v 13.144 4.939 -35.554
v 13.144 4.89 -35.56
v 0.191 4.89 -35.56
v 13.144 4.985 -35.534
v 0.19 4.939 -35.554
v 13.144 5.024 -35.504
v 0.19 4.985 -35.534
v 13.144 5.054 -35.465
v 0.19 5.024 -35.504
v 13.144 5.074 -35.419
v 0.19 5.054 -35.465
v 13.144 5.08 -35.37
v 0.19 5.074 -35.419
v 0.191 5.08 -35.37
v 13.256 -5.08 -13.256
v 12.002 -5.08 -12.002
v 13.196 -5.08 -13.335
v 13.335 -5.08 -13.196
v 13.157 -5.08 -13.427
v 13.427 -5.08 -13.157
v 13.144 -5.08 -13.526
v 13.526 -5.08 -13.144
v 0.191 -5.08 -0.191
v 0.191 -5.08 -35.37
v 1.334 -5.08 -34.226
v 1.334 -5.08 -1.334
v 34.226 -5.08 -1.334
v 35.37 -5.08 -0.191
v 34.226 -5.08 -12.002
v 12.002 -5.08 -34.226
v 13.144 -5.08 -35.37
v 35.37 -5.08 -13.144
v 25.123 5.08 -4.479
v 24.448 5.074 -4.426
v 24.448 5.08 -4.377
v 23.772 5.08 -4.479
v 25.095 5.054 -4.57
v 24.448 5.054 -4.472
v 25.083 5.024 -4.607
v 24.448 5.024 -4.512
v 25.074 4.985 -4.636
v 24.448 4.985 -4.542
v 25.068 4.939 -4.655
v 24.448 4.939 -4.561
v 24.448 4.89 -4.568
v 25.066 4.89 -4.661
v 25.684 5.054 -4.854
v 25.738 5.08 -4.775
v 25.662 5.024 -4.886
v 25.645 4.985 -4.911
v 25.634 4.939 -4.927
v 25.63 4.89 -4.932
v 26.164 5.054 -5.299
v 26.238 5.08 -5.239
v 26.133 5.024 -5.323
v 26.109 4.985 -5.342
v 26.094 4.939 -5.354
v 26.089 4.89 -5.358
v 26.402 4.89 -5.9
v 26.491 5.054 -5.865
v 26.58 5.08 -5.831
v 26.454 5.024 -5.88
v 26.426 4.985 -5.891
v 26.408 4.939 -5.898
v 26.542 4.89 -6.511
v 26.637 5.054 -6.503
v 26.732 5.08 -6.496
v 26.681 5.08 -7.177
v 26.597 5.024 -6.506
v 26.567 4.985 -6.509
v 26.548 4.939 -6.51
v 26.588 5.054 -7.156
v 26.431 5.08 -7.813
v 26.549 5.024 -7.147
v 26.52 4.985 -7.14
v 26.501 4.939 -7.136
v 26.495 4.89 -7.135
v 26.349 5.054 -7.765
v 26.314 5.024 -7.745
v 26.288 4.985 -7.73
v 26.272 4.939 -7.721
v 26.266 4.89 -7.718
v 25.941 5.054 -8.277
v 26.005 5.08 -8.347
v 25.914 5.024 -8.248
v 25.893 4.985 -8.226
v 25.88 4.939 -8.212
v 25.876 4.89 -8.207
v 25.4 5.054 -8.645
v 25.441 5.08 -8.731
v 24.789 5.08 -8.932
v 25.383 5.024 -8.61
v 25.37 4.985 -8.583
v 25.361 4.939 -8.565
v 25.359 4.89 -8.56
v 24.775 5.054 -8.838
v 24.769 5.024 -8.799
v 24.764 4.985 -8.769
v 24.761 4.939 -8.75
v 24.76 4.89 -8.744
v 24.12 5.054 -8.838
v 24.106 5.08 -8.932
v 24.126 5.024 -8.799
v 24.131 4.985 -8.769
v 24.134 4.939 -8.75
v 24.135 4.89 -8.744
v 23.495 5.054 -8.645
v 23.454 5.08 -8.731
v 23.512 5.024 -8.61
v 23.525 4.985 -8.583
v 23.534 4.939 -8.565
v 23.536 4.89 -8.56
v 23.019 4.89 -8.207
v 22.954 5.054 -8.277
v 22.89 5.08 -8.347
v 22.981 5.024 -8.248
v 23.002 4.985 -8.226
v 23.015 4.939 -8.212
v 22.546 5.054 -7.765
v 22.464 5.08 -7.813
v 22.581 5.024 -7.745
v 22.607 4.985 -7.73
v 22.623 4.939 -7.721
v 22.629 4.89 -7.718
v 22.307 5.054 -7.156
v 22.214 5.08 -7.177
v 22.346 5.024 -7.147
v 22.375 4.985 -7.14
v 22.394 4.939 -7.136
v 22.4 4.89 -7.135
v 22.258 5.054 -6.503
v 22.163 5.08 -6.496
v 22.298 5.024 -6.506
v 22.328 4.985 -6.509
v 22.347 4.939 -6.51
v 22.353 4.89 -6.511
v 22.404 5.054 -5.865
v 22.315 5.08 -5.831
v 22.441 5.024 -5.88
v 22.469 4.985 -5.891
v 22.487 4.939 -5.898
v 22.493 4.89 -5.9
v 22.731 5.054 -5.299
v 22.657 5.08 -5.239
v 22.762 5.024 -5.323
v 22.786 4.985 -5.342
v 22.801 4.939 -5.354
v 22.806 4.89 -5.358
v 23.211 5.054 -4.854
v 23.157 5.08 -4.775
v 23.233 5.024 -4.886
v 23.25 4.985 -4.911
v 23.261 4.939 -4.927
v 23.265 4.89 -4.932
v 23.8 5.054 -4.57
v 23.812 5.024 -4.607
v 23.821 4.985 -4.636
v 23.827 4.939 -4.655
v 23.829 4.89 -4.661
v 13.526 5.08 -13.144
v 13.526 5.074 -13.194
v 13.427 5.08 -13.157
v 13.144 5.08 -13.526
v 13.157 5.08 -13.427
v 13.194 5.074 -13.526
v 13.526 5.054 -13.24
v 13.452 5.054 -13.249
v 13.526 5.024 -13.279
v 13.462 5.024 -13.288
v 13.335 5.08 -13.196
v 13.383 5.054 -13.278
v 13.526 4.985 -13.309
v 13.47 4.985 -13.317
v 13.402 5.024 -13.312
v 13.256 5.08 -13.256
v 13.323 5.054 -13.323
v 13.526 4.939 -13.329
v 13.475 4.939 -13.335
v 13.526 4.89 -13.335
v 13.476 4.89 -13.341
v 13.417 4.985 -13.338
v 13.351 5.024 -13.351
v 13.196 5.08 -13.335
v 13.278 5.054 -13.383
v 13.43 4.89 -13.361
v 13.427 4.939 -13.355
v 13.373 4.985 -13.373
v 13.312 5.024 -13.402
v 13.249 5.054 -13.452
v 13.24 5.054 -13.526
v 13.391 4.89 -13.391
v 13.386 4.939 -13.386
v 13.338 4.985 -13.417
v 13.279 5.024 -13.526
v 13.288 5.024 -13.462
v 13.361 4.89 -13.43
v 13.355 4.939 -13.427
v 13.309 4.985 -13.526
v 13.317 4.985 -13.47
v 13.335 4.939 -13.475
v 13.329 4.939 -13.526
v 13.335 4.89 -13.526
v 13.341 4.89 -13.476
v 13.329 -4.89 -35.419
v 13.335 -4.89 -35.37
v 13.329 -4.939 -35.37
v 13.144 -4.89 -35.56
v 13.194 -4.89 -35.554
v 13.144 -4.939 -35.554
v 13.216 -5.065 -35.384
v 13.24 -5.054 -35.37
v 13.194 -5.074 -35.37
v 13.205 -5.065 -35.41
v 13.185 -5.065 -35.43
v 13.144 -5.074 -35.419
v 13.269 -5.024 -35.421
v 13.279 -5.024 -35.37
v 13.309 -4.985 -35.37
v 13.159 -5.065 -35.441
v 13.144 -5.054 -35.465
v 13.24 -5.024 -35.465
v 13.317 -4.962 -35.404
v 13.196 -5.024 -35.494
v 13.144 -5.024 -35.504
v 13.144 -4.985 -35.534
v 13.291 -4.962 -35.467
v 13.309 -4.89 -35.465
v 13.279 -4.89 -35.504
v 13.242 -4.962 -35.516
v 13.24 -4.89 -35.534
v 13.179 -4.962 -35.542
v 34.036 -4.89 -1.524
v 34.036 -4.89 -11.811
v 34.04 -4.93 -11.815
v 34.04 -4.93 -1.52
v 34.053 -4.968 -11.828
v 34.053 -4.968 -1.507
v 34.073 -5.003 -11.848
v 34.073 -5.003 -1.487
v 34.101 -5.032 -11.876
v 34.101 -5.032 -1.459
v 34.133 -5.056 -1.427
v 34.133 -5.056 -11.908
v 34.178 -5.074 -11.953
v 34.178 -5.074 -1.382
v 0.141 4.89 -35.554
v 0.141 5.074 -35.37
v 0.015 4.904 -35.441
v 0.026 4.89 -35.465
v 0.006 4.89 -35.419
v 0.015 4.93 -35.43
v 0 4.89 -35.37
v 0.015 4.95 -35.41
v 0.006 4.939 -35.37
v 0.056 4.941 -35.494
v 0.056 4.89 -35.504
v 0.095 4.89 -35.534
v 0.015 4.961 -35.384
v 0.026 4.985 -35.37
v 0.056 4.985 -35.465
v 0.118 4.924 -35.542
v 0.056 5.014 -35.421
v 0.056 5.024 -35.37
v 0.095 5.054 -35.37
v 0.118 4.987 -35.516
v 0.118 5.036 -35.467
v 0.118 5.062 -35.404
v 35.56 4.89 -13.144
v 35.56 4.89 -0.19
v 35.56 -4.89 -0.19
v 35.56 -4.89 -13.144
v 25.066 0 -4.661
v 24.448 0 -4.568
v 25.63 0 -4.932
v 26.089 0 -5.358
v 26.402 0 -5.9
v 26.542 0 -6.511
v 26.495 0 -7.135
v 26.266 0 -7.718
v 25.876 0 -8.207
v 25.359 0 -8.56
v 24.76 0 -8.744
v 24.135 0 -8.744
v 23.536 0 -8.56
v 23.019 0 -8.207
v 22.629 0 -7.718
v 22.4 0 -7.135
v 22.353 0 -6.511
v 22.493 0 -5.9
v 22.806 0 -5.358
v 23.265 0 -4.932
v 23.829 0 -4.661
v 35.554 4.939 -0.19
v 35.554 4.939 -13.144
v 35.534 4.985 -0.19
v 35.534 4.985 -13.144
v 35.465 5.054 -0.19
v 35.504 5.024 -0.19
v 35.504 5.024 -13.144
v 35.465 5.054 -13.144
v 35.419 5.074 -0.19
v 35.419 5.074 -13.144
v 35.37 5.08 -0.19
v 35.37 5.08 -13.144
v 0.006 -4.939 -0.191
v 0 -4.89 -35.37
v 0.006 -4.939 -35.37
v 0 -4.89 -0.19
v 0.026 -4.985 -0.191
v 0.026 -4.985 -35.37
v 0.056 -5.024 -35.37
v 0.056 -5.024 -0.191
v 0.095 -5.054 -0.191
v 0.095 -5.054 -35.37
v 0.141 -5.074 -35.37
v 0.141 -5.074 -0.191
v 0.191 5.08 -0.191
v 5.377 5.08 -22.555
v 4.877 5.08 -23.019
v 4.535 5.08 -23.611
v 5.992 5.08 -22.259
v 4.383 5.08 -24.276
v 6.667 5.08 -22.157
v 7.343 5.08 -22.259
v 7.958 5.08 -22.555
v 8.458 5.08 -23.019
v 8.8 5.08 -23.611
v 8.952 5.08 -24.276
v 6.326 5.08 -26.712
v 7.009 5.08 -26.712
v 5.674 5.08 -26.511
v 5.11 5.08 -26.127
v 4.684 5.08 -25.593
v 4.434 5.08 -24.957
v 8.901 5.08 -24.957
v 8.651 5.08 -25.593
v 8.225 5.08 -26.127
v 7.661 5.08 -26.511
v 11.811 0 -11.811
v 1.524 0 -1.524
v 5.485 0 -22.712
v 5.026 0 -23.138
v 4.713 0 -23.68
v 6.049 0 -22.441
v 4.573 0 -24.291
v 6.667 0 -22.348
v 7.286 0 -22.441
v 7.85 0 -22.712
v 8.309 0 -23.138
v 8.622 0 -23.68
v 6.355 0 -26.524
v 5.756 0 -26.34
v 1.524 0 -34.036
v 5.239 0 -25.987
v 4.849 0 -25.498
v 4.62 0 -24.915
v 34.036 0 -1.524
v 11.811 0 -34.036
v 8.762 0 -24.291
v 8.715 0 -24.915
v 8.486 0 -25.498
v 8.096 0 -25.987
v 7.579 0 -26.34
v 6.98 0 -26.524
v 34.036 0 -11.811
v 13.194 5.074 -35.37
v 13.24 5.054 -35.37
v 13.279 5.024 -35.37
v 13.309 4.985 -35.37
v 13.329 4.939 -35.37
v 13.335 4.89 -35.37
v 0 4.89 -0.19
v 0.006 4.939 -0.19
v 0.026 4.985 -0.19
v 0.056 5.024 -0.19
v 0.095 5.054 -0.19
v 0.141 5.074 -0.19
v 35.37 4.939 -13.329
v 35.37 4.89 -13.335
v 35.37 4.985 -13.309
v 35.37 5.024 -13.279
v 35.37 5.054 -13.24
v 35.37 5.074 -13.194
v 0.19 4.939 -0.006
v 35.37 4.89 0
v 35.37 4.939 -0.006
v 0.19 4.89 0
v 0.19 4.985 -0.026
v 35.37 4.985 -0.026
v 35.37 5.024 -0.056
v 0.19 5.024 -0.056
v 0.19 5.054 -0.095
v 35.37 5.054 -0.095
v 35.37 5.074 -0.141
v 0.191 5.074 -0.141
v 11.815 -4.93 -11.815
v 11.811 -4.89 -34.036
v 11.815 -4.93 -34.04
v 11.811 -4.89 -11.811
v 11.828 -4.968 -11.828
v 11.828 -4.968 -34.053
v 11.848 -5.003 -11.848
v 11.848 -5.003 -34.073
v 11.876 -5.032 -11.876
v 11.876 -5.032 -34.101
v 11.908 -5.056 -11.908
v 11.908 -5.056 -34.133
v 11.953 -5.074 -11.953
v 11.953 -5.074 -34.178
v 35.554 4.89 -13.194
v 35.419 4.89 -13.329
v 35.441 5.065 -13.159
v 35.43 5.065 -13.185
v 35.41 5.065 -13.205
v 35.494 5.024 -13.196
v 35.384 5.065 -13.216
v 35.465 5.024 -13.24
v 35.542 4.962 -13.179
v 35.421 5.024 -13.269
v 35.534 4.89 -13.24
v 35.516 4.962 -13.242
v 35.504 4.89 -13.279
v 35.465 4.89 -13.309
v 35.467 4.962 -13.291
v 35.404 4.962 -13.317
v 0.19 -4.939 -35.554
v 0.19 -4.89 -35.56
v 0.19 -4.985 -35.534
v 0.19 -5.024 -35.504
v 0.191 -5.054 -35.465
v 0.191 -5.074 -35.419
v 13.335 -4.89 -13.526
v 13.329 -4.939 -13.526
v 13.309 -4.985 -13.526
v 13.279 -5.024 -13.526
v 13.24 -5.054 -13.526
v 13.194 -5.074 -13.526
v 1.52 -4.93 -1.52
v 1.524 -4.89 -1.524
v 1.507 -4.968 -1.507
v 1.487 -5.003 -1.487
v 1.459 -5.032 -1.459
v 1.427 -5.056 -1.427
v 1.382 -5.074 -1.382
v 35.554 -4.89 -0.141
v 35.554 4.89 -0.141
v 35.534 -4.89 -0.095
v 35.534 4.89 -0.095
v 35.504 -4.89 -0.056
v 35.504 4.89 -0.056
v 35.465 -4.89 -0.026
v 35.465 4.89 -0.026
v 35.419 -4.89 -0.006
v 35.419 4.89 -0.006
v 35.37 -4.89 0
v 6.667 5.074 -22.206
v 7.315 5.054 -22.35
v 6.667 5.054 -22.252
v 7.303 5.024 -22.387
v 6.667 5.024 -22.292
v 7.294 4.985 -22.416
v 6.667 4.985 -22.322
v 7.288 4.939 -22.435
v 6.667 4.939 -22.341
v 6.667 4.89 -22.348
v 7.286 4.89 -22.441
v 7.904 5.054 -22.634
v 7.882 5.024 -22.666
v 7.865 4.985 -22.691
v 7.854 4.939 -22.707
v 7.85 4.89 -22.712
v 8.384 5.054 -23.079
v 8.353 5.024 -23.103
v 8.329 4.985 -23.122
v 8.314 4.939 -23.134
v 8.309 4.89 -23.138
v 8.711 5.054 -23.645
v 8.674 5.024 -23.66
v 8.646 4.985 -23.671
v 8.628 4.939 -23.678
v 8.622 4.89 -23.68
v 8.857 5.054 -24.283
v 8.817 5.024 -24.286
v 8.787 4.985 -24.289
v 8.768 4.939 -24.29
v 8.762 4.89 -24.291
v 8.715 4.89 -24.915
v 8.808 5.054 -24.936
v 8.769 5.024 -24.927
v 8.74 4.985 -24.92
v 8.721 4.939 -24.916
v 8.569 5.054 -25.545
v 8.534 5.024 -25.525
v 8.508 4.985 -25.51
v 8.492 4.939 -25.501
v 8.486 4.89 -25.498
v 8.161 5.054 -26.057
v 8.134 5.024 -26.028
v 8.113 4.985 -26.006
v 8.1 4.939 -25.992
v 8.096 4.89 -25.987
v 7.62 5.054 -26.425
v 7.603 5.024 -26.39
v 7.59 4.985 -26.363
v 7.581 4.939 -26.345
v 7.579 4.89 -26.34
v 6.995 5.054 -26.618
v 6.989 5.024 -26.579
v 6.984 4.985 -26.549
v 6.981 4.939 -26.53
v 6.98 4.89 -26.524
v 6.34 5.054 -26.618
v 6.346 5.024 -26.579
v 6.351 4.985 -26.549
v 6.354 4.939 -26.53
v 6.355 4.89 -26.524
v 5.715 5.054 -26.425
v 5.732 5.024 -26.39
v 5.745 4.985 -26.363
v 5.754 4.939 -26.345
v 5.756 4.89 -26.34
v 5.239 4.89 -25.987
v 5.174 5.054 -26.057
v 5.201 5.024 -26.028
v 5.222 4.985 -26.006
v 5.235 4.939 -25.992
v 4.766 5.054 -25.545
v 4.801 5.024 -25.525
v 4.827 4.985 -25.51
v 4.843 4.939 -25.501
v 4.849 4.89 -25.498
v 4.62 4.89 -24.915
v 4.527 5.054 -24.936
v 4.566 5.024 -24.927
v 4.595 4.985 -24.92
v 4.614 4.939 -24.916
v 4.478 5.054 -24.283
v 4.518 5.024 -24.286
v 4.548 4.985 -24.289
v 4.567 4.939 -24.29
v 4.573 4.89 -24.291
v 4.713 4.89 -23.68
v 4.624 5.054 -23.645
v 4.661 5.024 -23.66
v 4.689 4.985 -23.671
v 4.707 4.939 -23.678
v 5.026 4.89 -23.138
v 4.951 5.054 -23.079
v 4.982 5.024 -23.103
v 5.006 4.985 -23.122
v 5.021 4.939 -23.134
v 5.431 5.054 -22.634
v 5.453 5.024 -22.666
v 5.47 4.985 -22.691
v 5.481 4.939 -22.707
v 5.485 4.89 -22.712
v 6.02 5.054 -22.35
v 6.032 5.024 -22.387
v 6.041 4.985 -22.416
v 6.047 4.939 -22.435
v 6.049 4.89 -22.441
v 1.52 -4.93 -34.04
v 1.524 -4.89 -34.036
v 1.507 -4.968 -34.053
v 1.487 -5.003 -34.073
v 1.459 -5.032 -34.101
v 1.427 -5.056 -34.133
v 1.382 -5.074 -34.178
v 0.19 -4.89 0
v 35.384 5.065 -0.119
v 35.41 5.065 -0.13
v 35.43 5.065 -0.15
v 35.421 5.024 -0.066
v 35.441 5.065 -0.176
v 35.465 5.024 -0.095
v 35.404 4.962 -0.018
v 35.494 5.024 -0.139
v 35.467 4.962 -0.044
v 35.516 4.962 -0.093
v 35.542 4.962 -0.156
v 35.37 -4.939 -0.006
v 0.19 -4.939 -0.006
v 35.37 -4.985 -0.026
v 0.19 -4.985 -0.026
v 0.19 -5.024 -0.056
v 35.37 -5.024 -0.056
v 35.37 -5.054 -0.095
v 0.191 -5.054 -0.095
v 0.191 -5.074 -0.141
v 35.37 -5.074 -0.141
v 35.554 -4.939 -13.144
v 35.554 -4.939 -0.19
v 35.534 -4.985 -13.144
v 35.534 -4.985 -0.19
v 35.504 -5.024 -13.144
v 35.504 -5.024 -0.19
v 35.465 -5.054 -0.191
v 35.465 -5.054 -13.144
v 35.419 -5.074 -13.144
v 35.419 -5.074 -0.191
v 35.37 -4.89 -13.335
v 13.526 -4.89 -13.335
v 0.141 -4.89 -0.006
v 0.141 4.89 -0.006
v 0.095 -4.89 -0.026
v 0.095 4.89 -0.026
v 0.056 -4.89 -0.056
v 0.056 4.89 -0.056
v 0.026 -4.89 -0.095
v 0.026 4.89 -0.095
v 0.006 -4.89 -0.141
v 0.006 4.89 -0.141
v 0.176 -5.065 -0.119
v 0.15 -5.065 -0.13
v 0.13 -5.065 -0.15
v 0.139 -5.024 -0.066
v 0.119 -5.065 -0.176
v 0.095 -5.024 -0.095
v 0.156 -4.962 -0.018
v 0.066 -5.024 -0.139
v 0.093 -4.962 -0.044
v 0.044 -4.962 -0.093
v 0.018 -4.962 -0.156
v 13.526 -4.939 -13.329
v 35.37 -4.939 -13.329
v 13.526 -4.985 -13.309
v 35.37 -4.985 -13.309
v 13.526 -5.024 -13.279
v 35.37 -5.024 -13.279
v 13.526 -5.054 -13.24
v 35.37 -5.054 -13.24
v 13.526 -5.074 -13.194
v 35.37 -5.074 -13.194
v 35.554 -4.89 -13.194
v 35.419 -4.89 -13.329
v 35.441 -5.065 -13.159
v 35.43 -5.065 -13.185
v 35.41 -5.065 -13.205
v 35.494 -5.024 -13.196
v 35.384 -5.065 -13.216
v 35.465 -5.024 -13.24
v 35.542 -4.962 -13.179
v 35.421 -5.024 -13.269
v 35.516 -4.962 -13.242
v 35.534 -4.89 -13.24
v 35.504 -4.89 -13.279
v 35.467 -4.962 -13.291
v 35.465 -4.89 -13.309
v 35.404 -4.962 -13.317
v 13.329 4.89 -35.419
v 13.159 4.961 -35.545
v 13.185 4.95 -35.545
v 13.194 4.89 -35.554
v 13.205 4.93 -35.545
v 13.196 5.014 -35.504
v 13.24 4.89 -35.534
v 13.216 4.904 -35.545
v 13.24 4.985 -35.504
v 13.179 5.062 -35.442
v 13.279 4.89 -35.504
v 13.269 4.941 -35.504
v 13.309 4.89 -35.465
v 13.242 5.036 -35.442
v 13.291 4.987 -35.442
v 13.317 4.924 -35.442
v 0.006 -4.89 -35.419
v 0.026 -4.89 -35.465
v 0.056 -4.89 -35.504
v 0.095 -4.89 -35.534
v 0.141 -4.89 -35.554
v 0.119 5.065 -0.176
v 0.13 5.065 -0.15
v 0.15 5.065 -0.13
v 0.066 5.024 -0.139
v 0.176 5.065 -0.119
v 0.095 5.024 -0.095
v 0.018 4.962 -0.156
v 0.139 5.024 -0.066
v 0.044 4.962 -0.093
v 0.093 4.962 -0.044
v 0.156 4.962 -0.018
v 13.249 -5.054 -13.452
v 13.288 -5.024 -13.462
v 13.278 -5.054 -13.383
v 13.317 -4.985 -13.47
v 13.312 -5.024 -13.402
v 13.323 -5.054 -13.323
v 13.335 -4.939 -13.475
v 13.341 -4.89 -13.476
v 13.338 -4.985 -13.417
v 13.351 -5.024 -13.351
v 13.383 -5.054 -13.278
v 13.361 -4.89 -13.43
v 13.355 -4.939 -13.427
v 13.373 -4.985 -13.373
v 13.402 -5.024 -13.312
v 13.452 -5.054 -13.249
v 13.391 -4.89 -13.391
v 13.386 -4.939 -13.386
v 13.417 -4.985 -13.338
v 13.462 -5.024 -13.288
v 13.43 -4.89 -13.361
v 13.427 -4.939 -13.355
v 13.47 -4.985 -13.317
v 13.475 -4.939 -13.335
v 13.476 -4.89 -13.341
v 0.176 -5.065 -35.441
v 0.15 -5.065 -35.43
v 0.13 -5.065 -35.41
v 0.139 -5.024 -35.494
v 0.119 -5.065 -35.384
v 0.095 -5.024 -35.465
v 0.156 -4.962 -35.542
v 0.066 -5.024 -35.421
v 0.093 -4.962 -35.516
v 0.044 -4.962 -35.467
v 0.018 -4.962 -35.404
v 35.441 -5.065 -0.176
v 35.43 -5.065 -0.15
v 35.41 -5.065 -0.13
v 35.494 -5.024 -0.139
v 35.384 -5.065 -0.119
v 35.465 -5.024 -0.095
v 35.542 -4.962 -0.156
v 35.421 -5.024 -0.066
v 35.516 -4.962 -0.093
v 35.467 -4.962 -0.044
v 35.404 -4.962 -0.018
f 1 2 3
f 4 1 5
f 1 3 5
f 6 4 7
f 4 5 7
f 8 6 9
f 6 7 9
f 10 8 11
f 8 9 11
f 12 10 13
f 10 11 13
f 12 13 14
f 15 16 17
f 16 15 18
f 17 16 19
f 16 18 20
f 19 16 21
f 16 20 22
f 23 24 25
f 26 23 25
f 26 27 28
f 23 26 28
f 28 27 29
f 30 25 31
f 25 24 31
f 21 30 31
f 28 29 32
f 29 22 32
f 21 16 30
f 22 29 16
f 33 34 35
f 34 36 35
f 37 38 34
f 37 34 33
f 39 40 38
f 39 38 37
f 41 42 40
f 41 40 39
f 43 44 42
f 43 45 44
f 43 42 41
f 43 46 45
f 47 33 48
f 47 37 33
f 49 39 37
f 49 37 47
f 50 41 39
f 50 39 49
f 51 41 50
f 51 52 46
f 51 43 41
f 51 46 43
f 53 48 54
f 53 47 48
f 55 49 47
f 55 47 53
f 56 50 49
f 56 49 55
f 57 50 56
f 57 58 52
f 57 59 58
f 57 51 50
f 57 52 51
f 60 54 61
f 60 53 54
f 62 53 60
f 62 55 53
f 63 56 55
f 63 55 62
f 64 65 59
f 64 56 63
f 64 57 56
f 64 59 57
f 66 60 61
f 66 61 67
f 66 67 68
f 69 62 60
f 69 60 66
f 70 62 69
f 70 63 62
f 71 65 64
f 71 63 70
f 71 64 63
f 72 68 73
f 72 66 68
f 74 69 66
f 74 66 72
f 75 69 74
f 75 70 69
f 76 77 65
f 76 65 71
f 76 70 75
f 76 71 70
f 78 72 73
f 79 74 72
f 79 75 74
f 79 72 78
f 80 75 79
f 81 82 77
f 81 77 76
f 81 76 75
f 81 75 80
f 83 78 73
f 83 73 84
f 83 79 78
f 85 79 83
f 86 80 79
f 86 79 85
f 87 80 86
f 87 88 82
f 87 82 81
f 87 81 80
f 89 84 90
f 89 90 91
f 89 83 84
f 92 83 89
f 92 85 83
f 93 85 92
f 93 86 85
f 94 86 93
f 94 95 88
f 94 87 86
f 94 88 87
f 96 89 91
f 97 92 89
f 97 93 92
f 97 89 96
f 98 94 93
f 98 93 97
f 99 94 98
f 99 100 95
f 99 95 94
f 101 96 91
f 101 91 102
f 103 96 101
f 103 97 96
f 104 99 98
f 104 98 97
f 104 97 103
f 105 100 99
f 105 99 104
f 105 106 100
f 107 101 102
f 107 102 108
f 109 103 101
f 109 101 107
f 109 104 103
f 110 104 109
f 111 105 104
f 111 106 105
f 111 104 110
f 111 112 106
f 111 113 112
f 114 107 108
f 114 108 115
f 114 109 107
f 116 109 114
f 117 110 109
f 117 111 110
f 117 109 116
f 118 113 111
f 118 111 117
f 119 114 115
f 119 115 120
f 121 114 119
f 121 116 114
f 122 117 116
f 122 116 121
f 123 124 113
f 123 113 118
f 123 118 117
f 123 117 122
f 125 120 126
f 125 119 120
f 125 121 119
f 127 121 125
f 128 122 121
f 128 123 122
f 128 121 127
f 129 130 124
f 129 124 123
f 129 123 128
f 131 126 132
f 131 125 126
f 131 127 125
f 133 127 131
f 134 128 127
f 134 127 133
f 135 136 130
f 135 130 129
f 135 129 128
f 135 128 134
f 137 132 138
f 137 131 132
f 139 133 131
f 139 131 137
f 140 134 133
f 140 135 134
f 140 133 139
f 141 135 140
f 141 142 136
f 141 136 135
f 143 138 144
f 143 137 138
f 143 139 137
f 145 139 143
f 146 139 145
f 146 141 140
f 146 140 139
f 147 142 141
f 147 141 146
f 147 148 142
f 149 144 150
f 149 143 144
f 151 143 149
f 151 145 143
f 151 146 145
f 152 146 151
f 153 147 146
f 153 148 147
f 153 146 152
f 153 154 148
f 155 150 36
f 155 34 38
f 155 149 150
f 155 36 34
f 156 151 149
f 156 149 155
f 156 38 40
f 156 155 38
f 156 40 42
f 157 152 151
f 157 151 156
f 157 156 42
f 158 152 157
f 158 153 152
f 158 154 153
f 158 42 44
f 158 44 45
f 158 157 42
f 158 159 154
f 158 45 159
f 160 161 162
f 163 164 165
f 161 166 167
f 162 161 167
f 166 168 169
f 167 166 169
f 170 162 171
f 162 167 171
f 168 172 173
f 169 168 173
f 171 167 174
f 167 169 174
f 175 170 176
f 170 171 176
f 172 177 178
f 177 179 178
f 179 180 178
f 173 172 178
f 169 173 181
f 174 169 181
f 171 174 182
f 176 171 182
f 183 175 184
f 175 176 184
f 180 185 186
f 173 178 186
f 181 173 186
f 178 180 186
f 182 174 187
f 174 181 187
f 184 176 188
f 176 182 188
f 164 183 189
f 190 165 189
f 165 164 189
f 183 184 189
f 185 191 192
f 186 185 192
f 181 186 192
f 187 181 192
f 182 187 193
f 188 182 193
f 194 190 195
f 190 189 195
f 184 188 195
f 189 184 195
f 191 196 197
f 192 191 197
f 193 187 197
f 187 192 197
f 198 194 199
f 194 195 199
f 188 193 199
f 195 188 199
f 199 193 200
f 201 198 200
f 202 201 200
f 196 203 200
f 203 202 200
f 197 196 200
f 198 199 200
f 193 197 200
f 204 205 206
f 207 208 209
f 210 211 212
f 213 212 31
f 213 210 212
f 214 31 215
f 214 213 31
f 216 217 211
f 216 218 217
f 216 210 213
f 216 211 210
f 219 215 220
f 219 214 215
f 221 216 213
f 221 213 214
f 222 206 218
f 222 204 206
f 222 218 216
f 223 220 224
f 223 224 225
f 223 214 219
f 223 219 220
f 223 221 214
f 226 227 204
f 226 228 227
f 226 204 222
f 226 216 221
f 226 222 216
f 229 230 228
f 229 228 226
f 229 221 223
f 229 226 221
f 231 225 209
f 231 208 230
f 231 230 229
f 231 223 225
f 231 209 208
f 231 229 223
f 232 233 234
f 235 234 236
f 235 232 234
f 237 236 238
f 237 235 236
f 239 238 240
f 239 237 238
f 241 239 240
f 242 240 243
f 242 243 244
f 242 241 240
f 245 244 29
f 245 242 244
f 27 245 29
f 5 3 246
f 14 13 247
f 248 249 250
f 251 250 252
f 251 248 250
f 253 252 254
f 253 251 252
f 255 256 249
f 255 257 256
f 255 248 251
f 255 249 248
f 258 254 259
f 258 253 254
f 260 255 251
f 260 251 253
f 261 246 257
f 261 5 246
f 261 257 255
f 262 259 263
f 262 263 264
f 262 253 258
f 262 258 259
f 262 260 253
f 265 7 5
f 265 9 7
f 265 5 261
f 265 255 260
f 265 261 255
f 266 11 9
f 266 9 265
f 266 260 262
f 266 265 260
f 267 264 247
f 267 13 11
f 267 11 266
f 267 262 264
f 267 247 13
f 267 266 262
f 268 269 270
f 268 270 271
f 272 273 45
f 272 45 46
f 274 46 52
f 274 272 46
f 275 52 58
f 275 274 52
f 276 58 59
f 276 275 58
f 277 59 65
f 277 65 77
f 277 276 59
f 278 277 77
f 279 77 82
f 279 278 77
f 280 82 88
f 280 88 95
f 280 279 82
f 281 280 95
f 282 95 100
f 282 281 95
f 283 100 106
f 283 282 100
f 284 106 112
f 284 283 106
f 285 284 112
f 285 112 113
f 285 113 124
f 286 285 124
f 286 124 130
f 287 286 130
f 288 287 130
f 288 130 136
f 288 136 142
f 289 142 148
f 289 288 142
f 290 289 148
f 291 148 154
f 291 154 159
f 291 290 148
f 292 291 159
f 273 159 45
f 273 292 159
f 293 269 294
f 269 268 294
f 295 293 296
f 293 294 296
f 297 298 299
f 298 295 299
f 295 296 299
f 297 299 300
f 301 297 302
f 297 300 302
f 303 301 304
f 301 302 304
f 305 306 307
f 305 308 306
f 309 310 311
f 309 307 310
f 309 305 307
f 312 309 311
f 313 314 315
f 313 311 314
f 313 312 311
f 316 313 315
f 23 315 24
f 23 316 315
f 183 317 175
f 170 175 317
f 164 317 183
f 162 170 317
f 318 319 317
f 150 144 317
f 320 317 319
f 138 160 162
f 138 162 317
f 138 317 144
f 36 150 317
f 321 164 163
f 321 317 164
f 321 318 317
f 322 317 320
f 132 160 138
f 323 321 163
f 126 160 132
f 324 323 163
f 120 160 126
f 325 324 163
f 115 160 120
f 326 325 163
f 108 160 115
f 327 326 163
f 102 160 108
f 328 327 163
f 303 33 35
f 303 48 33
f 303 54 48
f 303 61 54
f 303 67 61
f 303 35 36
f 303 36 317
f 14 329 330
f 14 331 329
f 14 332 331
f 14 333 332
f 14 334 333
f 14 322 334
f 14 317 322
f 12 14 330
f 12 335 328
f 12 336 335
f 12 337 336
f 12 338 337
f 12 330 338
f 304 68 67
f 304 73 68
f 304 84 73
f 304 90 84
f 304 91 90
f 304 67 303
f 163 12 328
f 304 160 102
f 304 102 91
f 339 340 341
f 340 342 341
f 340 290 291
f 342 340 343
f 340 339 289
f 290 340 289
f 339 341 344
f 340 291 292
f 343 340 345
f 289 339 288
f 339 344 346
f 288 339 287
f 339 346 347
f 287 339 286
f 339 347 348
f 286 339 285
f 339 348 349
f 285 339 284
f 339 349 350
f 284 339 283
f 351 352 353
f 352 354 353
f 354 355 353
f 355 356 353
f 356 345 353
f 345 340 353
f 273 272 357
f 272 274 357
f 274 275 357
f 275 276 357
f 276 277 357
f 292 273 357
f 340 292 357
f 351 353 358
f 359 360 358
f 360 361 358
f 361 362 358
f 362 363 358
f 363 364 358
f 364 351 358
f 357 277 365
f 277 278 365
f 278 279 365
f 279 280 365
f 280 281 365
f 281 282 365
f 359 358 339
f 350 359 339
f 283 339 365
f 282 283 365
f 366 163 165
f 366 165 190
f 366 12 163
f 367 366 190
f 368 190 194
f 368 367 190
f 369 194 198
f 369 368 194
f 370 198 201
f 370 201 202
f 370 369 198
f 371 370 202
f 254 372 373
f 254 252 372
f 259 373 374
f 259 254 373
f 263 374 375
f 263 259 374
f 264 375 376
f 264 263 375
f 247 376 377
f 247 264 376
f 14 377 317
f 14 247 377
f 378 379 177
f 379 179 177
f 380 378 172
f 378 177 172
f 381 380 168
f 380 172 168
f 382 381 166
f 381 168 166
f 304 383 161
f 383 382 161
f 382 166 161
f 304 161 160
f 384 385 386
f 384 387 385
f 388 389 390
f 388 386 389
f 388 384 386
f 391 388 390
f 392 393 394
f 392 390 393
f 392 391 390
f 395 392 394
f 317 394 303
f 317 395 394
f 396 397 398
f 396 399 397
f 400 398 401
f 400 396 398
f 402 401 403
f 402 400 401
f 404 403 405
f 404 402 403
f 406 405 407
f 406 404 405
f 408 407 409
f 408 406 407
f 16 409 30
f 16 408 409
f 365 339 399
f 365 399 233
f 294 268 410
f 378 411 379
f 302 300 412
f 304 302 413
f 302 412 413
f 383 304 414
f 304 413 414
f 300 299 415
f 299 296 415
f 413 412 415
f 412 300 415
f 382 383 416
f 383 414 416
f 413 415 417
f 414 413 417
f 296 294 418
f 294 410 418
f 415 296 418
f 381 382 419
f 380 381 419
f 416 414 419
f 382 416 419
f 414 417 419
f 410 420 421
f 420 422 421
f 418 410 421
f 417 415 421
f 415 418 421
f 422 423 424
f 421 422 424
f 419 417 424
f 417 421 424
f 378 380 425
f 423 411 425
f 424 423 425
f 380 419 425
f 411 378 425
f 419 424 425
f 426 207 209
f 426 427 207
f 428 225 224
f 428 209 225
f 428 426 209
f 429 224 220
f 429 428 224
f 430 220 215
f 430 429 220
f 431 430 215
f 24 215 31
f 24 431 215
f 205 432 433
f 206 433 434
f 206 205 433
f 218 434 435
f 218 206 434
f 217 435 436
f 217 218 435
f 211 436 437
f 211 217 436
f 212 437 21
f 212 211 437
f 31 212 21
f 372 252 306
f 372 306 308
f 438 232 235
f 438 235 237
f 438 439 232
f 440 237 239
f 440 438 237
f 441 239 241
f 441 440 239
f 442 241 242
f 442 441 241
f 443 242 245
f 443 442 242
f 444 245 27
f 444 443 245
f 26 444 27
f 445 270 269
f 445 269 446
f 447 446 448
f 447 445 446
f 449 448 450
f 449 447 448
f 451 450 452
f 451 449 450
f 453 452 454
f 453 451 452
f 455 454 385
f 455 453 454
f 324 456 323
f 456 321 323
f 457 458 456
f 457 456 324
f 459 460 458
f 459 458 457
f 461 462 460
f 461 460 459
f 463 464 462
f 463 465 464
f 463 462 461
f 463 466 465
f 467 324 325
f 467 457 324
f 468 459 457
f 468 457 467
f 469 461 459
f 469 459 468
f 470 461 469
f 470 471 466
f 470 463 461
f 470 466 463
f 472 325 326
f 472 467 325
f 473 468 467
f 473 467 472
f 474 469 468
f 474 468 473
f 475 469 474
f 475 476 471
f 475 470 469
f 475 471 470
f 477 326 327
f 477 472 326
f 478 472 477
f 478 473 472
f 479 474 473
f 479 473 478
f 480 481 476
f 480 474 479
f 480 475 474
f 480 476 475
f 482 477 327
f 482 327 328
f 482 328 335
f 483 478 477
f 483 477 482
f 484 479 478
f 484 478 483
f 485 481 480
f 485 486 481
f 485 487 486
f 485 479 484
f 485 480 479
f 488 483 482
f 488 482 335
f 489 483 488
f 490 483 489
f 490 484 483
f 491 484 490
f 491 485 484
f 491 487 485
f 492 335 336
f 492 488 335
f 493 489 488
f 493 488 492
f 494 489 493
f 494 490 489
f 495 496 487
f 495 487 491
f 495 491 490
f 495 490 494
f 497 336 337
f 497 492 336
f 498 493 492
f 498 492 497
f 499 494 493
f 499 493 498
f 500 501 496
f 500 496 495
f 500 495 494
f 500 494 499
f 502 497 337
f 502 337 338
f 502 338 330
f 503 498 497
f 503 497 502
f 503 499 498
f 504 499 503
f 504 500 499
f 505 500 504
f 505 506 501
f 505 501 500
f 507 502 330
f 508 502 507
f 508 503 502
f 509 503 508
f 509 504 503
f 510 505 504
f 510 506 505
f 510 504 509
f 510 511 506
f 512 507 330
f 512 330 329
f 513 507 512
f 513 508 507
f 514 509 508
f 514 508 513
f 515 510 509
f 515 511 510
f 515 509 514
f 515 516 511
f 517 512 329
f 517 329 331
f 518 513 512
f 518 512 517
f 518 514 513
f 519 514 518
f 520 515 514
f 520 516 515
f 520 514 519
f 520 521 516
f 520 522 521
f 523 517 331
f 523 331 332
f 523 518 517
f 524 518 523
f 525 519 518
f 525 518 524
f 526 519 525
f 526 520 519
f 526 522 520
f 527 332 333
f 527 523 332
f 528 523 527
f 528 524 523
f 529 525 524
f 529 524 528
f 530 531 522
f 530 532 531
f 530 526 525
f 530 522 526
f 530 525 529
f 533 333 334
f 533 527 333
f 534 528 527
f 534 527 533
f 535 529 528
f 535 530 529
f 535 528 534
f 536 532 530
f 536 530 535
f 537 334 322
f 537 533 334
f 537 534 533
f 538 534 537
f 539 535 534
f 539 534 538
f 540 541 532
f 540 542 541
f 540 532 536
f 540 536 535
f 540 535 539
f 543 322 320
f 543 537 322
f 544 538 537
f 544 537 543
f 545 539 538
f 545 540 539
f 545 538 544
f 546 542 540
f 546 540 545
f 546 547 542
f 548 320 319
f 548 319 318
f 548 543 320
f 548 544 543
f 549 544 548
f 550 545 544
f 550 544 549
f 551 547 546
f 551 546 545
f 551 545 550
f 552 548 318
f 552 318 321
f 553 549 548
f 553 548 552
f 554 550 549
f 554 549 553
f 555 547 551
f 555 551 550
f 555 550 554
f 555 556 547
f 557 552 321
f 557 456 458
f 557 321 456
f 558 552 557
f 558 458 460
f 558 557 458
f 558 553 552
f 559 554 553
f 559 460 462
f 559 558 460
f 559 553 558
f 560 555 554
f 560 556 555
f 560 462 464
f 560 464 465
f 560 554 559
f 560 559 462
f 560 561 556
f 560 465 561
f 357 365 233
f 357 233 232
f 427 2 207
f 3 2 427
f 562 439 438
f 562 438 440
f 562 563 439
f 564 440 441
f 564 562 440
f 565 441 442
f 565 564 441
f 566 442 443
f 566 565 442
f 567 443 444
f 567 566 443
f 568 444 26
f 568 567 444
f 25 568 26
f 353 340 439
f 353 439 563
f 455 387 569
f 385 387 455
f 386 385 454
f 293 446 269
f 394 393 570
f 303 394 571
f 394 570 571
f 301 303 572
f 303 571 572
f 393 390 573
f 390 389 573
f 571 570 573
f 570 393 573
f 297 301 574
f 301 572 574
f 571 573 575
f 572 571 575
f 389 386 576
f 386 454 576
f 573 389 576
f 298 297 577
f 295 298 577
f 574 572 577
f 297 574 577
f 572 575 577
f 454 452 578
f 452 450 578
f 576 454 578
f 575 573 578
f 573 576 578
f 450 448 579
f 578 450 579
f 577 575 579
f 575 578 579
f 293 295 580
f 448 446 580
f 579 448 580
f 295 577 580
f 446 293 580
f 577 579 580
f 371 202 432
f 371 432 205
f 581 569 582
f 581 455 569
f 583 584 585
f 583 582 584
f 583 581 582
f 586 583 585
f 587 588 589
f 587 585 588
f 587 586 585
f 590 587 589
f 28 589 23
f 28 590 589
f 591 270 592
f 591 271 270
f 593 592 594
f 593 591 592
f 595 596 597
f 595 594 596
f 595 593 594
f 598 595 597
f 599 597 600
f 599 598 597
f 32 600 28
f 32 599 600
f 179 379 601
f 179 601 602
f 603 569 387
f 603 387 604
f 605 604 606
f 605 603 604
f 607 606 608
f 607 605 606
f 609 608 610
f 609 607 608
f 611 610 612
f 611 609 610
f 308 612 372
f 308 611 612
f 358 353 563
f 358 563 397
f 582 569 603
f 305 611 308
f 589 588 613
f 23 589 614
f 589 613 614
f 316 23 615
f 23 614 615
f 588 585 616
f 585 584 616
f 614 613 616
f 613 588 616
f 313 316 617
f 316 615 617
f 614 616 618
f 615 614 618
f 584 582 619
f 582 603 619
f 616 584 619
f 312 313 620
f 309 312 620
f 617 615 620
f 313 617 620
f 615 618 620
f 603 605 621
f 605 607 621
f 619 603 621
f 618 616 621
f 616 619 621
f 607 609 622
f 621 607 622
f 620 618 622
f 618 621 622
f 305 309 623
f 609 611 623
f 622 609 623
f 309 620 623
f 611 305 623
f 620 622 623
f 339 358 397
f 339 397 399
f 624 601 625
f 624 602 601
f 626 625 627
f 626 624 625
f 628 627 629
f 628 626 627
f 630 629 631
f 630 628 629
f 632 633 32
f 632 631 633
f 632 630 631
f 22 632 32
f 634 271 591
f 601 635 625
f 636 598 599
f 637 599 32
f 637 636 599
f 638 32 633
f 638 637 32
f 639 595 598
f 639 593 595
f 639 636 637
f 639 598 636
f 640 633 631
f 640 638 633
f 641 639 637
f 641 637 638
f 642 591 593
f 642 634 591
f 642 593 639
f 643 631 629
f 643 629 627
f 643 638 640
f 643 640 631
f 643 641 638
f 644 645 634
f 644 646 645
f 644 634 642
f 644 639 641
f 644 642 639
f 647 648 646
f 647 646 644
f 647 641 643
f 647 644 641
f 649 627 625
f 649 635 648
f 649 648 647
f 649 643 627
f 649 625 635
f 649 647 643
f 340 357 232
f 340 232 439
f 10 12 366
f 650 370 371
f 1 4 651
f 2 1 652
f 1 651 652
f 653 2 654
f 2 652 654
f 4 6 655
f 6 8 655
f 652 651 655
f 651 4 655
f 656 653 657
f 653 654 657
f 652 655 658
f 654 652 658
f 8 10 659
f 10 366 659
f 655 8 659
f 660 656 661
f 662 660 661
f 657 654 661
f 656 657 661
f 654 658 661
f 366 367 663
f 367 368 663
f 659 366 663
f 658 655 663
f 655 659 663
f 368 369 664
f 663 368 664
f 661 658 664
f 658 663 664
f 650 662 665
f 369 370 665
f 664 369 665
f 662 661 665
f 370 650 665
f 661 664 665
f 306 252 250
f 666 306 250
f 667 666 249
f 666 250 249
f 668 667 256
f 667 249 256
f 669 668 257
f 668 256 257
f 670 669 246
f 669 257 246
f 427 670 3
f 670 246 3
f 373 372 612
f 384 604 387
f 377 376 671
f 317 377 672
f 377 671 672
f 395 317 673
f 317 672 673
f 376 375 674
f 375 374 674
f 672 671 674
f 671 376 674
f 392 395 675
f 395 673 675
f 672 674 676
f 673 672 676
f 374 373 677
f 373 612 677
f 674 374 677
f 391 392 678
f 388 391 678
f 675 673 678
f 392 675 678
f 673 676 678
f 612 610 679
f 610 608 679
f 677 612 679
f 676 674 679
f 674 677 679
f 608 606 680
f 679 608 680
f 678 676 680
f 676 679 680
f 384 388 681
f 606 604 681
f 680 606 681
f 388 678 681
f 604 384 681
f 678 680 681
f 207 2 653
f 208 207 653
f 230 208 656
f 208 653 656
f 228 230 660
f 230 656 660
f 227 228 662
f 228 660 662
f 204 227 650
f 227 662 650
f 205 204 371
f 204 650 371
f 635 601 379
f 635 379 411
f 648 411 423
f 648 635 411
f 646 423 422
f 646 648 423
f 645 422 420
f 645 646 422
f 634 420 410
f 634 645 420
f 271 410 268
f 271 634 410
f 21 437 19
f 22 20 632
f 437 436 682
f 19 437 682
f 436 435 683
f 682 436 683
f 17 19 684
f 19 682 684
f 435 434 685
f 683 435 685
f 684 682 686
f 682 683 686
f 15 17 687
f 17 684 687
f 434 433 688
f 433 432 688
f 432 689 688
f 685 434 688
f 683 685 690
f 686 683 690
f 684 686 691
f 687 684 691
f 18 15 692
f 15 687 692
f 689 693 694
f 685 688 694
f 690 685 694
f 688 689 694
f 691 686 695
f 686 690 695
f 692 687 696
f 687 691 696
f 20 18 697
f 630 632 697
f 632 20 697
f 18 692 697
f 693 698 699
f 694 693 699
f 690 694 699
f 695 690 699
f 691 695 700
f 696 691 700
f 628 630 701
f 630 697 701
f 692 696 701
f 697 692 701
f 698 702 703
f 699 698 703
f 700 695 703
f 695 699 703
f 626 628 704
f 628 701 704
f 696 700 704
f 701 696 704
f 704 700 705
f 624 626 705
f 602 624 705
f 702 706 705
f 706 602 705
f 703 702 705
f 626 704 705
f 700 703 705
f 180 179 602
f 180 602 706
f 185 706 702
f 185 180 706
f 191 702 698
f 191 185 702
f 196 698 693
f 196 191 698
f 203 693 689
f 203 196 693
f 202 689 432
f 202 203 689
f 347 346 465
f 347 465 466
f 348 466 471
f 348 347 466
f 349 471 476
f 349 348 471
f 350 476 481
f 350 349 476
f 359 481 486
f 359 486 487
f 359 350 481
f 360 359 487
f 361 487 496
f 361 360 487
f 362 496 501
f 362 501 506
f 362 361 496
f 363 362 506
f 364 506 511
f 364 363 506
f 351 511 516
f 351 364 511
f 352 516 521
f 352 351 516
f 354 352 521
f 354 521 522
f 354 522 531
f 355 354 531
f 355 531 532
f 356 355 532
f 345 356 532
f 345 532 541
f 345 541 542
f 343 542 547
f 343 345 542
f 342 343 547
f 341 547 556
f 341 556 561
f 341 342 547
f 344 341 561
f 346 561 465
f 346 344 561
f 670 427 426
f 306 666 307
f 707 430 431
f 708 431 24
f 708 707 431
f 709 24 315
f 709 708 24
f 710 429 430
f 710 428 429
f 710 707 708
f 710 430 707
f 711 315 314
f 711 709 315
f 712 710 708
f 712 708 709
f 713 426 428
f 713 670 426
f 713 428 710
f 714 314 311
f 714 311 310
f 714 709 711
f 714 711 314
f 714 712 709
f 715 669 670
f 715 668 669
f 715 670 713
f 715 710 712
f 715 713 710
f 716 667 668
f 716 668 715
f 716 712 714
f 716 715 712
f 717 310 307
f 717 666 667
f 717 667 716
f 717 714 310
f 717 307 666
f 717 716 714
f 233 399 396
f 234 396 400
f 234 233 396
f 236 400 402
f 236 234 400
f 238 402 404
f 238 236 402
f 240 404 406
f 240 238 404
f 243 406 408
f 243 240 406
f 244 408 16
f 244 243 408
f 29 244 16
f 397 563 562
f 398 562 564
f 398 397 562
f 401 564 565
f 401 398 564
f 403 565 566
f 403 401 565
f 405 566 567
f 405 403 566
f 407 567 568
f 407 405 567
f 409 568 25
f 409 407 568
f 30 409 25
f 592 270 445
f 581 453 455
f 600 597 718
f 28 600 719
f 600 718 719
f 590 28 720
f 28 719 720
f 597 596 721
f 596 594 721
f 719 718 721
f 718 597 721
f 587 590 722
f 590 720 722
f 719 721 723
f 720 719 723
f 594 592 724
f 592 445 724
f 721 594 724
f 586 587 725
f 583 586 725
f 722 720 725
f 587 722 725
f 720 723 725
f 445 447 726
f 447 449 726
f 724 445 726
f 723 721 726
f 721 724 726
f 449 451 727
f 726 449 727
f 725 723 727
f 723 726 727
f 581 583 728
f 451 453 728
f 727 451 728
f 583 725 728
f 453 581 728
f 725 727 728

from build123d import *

# Parameters (mm, degrees)
SKETCH1_R           = 2.1
BOSS_EXTRUDE1_DEPTH = 5.08
BOSS_EXTRUDE2_DEPTH = 5.08
FILLET1_R           = 0.1905


with BuildPart() as part:
    # Sketch1 → Boss-Extrude1 (new body)
    with BuildSketch(Plane(origin=(0, 0, 0), x_dir=(1, 0, 0), z_dir=(0, 1, 0))):
        Polygon((0, 0), (35.56, 0), (35.56, 13.335), (13.335, 13.335), (13.335, 35.56), (0, 35.56), align=None)
        with Locations((6.6675, 24.4475)):
            Circle(SKETCH1_R, mode=Mode.SUBTRACT)
        with Locations((24.4475, 6.6675)):
            Circle(SKETCH1_R, mode=Mode.SUBTRACT)
    extrude(amount=BOSS_EXTRUDE1_DEPTH)

    # Sketch1<3> → Boss-Extrude2 (add)
    with BuildSketch(Plane(origin=(0, 0, 0), x_dir=(1, 0, 0), z_dir=(0, 1, 0))):
        Polygon((0, 0), (35.56, 0), (35.56, 13.335), (13.335, 13.335), (13.335, 35.56), (0, 35.56), align=None)
        Polygon((1.524, 34.036), (11.811, 34.036), (11.811, 11.811), (34.036, 11.811), (34.036, 1.524), (1.524, 1.524), align=None, mode=Mode.SUBTRACT)
    extrude(amount=-BOSS_EXTRUDE2_DEPTH)

    # Fillet1
    fillet1_edges = [part.edges().sort_by_distance(p)[0] for p in [
        (4.5675, 5.08, -24.4475),
        (22.3475, 5.08, -6.6675),
        (6.6675, 5.08, -35.56),
        (13.335, 5.08, -24.4475),
        (13.335, 0, -35.56),
        (24.4475, 5.08, -13.335),
        (13.335, 0, -13.335),
        (35.56, 5.08, -6.6675),
        (35.56, 0, -13.335),
        (17.78, 5.08, 0),
        (35.56, 0, 0),
        (0, 5.08, -17.78),
        (0, 0, 0),
        (0, 0, -35.56),
        (0, -5.08, -17.78),
        (17.78, -5.08, 0),
        (35.56, -5.08, -6.6675),
        (24.4475, -5.08, -13.335),
        (13.335, -5.08, -24.4475),
        (6.6675, -5.08, -35.56),
        (6.6675, -5.08, -34.036),
        (11.811, -5.08, -22.9235),
        (22.9235, -5.08, -11.811),
        (34.036, -5.08, -6.6675),
        (17.78, -5.08, -1.524),
        (1.524, -5.08, -17.78),
    ]]
    fillet(fillet1_edges, radius=FILLET1_R)


solid = part.part
